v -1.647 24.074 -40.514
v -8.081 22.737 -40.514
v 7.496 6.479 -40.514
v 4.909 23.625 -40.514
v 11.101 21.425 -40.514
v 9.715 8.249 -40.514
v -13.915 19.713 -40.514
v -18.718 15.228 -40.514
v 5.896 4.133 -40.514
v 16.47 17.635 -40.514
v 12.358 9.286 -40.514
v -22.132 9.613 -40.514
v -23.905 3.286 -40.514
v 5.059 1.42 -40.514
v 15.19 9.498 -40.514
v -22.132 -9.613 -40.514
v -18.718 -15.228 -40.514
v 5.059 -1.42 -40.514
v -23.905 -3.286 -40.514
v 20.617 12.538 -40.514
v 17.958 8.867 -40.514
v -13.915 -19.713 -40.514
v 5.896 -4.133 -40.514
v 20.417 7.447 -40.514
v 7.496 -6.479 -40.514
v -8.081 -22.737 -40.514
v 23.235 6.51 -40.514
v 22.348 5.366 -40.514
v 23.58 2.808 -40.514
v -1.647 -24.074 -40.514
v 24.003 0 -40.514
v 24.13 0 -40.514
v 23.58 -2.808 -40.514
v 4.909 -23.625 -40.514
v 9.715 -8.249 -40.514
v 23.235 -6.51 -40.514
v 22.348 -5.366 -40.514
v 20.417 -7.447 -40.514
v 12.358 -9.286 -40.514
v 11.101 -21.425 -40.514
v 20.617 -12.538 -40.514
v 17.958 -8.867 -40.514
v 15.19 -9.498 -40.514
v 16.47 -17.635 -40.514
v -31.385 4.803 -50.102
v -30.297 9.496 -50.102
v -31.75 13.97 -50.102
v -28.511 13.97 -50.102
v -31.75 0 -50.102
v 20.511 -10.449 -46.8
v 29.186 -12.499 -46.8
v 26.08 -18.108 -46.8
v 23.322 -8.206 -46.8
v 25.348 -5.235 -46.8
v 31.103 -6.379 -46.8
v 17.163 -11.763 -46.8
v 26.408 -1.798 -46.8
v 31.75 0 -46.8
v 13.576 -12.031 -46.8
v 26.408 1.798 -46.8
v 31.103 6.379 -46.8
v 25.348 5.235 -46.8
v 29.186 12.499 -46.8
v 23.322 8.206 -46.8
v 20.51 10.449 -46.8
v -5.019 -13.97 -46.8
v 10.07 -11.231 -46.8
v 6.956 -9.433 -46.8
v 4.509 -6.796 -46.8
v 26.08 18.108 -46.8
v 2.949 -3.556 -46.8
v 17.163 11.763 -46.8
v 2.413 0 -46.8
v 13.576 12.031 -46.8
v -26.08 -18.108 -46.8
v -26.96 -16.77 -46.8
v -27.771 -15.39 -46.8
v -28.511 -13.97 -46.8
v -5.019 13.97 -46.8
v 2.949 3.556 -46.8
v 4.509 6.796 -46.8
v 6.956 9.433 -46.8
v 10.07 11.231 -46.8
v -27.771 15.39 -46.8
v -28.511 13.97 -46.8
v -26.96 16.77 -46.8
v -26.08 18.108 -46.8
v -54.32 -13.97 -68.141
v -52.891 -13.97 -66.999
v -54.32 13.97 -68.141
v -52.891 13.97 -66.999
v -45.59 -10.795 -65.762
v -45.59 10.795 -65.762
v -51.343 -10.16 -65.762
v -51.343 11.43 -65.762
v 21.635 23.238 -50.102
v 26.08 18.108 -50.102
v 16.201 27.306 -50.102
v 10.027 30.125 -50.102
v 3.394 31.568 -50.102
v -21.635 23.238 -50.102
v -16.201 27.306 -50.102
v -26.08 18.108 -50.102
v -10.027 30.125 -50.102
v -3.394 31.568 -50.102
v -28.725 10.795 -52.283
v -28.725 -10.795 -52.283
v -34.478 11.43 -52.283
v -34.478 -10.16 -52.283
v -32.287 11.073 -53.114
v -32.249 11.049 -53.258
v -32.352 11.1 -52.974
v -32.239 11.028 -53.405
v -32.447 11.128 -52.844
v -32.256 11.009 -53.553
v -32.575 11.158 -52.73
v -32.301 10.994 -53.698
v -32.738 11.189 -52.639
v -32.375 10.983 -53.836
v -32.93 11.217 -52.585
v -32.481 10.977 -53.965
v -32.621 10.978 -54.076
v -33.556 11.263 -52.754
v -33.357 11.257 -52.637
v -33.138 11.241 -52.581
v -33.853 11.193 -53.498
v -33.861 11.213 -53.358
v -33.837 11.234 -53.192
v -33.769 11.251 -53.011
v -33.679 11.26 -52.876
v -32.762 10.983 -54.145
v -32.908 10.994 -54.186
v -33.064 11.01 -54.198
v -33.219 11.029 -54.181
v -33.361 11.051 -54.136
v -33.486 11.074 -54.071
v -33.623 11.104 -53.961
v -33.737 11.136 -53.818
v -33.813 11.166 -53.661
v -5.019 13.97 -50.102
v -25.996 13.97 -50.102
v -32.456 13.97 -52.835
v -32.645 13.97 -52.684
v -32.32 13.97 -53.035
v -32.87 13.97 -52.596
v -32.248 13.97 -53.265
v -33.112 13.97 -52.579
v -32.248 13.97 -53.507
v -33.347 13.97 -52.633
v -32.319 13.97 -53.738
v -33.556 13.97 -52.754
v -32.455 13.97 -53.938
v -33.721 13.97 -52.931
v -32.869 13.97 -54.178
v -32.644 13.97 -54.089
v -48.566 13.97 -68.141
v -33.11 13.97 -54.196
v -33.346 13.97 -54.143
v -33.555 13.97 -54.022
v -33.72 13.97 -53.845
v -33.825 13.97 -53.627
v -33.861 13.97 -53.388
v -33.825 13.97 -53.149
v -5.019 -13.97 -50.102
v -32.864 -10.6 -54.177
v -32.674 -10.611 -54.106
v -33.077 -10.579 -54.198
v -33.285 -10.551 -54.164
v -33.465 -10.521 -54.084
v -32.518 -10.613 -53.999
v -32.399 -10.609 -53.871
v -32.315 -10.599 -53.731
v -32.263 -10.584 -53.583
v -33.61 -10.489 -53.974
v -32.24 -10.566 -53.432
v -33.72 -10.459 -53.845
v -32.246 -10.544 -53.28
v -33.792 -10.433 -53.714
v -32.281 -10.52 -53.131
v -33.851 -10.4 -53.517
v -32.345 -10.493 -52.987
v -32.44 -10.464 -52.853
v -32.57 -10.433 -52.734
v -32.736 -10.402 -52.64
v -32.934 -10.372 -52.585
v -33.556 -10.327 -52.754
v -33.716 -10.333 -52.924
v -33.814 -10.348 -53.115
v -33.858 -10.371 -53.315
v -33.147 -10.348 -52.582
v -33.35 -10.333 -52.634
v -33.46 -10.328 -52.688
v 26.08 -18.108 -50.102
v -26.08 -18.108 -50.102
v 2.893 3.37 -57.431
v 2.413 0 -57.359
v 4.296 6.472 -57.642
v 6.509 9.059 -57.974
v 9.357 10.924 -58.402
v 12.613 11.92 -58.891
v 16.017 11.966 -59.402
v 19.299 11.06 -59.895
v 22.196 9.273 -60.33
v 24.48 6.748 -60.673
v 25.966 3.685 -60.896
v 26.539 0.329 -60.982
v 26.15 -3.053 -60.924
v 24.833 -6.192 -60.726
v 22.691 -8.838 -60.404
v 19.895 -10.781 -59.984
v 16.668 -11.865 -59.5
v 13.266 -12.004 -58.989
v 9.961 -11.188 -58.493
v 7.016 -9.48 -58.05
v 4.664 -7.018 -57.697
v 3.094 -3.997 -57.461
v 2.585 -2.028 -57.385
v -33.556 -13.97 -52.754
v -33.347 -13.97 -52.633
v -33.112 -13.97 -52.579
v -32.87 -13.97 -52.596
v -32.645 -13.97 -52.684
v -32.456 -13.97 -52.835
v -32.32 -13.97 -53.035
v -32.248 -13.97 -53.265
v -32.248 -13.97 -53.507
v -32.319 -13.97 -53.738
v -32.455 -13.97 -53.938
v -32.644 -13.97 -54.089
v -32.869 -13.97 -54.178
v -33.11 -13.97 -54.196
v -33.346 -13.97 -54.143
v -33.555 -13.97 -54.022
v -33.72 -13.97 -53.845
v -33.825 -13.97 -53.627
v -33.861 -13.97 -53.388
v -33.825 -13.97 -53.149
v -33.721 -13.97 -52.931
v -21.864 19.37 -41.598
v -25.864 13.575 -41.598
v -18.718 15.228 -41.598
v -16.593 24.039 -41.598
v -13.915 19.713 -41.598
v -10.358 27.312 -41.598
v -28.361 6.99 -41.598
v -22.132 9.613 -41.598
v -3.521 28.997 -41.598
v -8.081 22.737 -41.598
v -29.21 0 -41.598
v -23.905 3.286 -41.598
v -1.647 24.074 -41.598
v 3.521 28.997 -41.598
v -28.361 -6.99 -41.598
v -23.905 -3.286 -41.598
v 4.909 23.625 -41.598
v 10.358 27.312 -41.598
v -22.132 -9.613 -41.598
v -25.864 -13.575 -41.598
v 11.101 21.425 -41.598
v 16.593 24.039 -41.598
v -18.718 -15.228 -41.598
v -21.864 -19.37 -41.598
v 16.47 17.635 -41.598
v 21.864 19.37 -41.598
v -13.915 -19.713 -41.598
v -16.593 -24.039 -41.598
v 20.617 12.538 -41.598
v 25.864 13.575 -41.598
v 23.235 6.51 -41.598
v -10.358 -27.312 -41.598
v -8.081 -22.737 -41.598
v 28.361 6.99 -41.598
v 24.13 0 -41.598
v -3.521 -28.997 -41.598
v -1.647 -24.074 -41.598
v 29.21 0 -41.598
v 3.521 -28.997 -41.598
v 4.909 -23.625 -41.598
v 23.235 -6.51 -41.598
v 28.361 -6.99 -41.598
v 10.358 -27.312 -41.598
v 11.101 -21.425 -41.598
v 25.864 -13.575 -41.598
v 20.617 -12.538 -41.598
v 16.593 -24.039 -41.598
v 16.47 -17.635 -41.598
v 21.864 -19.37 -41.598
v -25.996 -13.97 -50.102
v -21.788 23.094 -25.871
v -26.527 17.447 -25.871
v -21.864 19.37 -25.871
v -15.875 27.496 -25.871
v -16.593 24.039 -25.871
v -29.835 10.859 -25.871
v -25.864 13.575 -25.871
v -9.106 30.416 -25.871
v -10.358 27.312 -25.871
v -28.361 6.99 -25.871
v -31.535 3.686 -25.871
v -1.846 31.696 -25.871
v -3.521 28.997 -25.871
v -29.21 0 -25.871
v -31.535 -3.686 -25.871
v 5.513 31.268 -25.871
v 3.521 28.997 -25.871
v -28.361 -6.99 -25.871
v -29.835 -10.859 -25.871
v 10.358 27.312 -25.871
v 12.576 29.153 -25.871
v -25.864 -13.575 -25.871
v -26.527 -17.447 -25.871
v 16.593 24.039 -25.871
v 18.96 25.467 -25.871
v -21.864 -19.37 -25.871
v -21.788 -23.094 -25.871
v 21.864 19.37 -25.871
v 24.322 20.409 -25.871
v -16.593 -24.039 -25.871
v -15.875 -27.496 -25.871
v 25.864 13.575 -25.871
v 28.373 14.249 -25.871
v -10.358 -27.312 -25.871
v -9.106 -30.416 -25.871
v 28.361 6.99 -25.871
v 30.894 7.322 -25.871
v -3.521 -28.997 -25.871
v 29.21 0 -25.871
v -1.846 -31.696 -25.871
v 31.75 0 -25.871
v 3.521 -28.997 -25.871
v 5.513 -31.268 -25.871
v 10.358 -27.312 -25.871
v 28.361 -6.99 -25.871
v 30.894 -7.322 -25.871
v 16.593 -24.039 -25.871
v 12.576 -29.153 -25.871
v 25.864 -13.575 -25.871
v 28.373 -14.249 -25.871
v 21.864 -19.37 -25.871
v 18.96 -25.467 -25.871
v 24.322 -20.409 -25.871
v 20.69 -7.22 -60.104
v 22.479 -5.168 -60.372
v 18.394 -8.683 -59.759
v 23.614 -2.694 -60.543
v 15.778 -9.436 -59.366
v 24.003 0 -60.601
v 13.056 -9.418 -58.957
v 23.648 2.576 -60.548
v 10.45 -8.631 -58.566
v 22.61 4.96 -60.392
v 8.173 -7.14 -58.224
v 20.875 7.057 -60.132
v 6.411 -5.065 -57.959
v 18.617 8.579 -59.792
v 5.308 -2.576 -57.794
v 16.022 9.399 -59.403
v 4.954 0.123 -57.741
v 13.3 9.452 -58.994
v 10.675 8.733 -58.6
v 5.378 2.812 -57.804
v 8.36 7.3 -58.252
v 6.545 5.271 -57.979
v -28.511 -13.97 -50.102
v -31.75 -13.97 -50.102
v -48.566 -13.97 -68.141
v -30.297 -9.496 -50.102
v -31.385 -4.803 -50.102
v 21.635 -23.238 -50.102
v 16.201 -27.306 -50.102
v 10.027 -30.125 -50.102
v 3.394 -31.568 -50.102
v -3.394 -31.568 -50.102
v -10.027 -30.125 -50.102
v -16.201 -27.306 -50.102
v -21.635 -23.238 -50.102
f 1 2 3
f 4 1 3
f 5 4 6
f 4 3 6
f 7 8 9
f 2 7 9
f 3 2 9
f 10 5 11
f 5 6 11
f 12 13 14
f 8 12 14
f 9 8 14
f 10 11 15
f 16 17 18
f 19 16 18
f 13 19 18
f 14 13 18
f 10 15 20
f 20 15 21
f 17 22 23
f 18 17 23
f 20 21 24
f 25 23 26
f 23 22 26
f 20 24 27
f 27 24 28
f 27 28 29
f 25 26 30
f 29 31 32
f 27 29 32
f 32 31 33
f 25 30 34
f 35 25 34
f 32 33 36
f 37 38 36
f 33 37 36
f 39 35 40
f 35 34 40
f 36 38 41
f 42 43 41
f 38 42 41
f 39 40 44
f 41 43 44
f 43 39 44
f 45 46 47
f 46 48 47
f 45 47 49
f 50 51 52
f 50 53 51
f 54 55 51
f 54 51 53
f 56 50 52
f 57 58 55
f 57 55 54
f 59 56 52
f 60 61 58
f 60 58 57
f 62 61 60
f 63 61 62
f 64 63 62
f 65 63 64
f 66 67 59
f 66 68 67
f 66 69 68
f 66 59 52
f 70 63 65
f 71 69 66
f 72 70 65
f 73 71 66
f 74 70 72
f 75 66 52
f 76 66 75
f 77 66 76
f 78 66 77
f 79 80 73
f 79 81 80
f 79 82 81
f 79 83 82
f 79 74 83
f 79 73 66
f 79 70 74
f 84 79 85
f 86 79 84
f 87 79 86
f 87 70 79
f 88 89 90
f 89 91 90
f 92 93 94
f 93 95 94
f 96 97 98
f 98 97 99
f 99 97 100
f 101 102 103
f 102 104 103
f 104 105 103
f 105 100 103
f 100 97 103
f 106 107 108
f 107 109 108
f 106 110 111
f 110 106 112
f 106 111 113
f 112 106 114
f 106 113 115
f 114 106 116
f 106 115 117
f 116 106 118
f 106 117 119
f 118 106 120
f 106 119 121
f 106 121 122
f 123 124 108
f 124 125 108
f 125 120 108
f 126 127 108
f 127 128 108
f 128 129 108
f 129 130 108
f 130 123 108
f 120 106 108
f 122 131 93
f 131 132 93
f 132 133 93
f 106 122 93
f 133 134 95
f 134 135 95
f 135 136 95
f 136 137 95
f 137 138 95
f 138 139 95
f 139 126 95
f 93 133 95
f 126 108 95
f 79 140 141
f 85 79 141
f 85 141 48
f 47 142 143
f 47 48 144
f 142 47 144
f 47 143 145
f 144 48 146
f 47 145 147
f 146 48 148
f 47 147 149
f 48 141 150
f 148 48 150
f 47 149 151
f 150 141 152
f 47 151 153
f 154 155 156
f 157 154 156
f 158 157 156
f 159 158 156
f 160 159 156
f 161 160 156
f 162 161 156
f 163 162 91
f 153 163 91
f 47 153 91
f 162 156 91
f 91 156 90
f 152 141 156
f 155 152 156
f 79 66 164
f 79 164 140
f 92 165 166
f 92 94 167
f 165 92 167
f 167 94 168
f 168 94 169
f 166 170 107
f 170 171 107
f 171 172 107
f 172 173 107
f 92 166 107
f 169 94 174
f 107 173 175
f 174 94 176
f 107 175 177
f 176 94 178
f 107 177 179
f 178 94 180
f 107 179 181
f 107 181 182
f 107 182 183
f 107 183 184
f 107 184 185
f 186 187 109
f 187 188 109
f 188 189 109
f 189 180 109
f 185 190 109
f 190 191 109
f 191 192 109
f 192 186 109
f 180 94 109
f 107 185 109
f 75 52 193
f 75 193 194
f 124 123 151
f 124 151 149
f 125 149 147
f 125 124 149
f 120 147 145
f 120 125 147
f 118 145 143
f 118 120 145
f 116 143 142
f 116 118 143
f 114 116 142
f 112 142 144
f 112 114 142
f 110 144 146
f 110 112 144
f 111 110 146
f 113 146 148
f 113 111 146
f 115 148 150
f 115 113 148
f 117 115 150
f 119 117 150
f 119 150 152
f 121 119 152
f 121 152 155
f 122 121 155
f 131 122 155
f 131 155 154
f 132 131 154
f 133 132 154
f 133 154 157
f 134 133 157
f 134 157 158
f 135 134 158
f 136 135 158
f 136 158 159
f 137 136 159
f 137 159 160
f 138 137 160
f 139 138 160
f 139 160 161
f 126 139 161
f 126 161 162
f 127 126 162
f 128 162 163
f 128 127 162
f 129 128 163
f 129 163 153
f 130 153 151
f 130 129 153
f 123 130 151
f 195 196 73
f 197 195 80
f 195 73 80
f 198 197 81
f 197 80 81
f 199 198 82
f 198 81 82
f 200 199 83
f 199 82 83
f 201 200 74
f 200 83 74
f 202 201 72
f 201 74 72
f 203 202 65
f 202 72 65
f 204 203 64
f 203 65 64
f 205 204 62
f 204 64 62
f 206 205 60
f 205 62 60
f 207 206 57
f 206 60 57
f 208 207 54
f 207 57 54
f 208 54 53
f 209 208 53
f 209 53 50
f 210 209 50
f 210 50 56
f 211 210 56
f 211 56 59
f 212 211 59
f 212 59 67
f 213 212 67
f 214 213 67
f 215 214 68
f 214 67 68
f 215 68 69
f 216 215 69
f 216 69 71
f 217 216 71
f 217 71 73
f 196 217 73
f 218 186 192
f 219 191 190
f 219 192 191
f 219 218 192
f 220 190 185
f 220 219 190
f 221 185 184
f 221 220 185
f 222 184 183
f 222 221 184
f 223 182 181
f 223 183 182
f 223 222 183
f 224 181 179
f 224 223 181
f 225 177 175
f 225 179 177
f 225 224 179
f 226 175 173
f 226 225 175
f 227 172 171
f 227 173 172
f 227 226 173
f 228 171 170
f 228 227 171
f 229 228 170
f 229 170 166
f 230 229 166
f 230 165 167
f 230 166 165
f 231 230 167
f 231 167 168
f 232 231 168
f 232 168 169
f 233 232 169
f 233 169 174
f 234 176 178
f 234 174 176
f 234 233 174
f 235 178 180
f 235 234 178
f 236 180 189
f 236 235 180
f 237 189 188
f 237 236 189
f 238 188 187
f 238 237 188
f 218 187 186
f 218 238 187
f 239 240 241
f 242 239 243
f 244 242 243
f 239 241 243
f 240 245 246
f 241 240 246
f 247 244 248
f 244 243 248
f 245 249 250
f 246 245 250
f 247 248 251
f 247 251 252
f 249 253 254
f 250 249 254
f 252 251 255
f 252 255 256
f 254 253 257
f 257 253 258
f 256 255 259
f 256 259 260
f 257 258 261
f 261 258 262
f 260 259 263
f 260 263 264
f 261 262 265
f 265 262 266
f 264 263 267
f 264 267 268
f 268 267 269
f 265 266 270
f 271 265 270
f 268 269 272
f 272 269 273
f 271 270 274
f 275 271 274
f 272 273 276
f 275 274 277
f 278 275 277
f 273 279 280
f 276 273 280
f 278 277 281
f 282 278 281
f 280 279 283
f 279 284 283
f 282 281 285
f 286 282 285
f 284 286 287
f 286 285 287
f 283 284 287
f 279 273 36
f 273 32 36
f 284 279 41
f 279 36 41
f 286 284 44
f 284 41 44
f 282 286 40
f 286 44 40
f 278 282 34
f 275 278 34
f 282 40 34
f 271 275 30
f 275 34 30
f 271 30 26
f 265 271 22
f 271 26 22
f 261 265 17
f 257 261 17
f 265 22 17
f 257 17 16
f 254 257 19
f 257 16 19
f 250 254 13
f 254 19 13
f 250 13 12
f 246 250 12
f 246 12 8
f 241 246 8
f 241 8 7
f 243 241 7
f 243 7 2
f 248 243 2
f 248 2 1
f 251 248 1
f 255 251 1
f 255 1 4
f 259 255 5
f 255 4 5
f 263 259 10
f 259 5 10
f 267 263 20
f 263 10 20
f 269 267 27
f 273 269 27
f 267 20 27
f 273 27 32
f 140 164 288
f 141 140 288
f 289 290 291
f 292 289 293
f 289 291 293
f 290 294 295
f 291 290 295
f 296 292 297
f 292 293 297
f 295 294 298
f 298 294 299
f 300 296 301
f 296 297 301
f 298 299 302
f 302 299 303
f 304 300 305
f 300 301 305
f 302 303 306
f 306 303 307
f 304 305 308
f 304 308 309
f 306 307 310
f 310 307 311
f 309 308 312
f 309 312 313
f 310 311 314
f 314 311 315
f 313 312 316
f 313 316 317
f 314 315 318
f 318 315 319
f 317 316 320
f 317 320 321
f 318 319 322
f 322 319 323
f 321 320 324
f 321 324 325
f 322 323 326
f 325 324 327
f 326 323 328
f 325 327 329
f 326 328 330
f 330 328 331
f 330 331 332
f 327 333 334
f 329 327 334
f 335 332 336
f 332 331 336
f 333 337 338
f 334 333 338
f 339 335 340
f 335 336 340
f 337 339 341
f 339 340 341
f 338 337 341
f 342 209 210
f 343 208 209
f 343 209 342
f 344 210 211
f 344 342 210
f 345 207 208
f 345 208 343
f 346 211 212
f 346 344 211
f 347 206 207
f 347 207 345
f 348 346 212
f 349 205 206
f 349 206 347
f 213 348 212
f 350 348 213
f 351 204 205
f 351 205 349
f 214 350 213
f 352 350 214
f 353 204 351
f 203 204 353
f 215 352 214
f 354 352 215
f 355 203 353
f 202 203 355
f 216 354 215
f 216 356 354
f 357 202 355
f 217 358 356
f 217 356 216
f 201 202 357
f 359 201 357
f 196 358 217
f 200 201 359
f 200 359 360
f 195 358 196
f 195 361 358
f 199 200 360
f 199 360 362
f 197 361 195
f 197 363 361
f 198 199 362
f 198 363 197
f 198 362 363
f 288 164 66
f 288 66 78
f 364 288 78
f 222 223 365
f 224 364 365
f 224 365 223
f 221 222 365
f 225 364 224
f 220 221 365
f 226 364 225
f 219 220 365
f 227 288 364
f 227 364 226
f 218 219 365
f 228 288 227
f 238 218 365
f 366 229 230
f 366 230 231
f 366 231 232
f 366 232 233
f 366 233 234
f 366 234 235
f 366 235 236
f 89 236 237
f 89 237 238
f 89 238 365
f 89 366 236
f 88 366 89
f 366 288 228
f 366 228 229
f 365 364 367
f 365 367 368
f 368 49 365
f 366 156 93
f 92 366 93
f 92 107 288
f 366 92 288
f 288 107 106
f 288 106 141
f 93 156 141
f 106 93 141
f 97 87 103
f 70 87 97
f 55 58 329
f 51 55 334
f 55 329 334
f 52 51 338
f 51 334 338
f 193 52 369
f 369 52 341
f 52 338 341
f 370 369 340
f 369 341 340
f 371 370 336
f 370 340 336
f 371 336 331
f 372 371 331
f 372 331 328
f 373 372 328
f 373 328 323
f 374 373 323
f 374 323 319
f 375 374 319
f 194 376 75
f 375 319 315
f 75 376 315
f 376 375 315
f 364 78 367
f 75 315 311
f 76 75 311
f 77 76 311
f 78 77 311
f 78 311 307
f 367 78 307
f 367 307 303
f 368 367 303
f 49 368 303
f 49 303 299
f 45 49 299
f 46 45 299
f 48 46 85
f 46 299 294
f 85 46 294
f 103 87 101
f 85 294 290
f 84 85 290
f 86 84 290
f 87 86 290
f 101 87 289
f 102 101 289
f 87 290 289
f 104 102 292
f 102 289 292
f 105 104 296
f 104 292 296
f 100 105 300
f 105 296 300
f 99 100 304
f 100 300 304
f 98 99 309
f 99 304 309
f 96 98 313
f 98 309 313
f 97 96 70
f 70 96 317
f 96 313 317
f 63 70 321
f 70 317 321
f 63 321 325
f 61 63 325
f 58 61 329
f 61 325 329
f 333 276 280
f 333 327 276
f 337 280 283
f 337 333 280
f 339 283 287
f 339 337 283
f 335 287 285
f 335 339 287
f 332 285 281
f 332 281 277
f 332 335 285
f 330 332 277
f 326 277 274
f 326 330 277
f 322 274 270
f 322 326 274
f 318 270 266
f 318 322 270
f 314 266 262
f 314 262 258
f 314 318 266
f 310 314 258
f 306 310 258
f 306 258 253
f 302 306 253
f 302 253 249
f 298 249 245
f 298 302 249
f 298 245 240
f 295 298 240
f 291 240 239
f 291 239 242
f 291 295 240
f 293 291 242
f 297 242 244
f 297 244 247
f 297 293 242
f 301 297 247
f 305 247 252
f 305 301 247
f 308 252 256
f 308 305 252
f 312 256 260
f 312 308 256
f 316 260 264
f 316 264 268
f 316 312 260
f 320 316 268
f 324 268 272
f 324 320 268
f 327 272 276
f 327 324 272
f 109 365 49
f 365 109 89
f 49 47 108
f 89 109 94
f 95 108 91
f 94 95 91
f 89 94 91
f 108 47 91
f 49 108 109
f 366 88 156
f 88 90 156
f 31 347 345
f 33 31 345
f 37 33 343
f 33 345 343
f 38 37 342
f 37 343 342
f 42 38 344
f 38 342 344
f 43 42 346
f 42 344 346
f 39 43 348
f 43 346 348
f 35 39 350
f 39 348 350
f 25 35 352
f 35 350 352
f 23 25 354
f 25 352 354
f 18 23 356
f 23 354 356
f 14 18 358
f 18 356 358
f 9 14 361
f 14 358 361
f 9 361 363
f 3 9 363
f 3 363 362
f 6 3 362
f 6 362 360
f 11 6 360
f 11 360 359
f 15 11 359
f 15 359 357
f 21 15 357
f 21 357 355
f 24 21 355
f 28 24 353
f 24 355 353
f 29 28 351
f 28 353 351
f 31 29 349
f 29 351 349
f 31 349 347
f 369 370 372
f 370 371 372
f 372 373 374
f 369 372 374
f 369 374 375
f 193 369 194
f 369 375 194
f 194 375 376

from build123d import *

# Parameters (mm, degrees)
SKETCH2_R                   = 9.525
LID_HOLE_DEPTH              = 50.8
SKETCH5_R                   = 12.065
LID_MOUTHPIECE_DEPTH        = 13.97
SKETCH6_R                   = 9.525
LID_HOLE_2_DEPTH            = 59.953263205
LID_HANDLE_DEPTH            = 13.97
SLOT_START                  = -3.302
SKETCH11_R                  = 12.065
SLOT_FOR_COVER_DEPTH        = 3.302
ANGLED_MOUTHPIECE_CUT_DEPTH = 12.7
CUT_EXTRUDE3_START          = -27.94
SKETCH15_R                  = 0.811013261
CUT_EXTRUDE3_DEPTH          = 27.94


with BuildPart() as part:
    # Sketch1 → Lid Shape (revolve)
    with BuildSketch(Plane(origin=(0, 0, 0), x_dir=(1, 0, 0), z_dir=(0, 1, 0))):
        Polygon((0, 50.10238266), (31.75, 50.10238266), (31.75, 25.87078266), (29.21, 25.87078266), (29.21, 40.51388266), (29.21, 41.597899191), (24.13, 41.597899191), (24.13, 40.51388266), (0, 40.51388266), align=None)
    revolve(axis=Axis((0, 0, 0), (0, 0, -1)))

    # Sketch2 → Lid Hole (cut)
    with BuildSketch(Plane.XY.offset(-40.51388266)):
        with Locations((14.478, 0)):
            Circle(SKETCH2_R)
    extrude(amount=-LID_HOLE_DEPTH, mode=Mode.SUBTRACT)

    # Sketch5 → Lid Mouthpiece (add)
    with BuildSketch(Plane(origin=(0, 0, -50.10238266), x_dir=(-1, 0, 0), z_dir=(0, 0, -1))):
        with Locations((-14.478, 0)):
            Circle(SKETCH5_R)
    extrude(amount=LID_MOUTHPIECE_DEPTH)

    # Sketch6 → Lid Hole 2 (cut, through all)
    with BuildSketch(Plane(origin=(0, 0, -64.07238266), x_dir=(-1, 0, 0), z_dir=(0, 0, -1))):
        with Locations(Location((-14.478, 0, 0), (0, 0, 180))):
            Circle(SKETCH6_R)
    extrude(amount=-LID_HOLE_2_DEPTH, mode=Mode.SUBTRACT)

    # Sketch8 → Lid Handle (add, symmetric)
    with BuildSketch(Plane(origin=(0, 0, 0), x_dir=(1, 0, 0), z_dir=(0, 1, 0))):
        Polygon((-31.75, 50.10238266), (-52.891013527, 66.999169477), (-54.31959445, 68.140951412), (-48.565910523, 68.140951412), (-25.996316072, 50.10238266), align=None)
    extrude(amount=LID_HANDLE_DEPTH, both=True)

    # Sketch9 → Handle Hole section 0
    with BuildSketch(Plane(origin=(14.301912302, 0, -17.894344333), x_dir=(-0.7811575478192837, 0, -0.6243339534936118), z_dir=(0.6243339534936119, 0, -0.7811575478192838))):
        with BuildLine():
            Line((55.080337161, 10.795), (76.670337161, 10.795))
            Line((76.670337161, 10.795), (76.670337161, -10.795))
            Line((76.670337161, -10.795), (55.080337161, -10.795))
            Line((55.080337161, -10.795), (55.080337161, 10.795))
        make_face()
    # Sketch10 → Handle Hole section 1
    with BuildSketch(Plane(origin=(12.059167241, 0, -15.088254384), x_dir=(0.7811575478192838, 0, 0.6243339534936119), z_dir=(-0.6243339534936118, 0, 0.7811575478192837))):
        with BuildLine():
            Line((-81.164870789, 11.43), (-59.574870789, 11.43))
            Line((-59.574870789, 11.43), (-59.574870789, -10.16))
            Line((-59.574870789, -10.16), (-81.164870789, -10.16))
            Line((-81.164870789, -10.16), (-81.164870789, 11.43))
        make_face()
    loft(mode=Mode.SUBTRACT)

    # Sketch11 → Slot for Cover (cut)
    with BuildSketch(Plane(origin=(0, 0, -50.10238266), x_dir=(-1, 0, 0), z_dir=(0, 0, -1)).offset(SLOT_START)):
        with BuildLine():
            ThreePointArc((28.511429287, 13.97), (27.373977798, 16.085019102), (26.079920429, 18.108016192))
            Line((26.079920429, 18.108016192), (-26.079920429, 18.108016192))
            ThreePointArc((-26.079920429, 18.108016192), (-30.299339709, 9.48749246), (-31.75, 0))
            ThreePointArc((-31.75, 0), (-30.299339709, -9.48749246), (-26.079920429, -18.108016192))
            Line((-26.079920429, -18.108016192), (26.079920429, -18.108016192))
            ThreePointArc((26.079920429, -18.108016192), (27.373977798, -16.085019102), (28.511429287, -13.97))
            Line((28.511429287, -13.97), (25.996316072, -13.97))
            Line((25.996316072, -13.97), (5.018618521, -13.97))
            Line((5.018618521, -13.97), (5.018618521, 13.97))
            Line((5.018618521, 13.97), (25.996316072, 13.97))
            Line((25.996316072, 13.97), (28.511429287, 13.97))
        make_face()
        with Locations((-14.478, 0)):
            Circle(SKETCH11_R, mode=Mode.SUBTRACT)
    extrude(amount=SLOT_FOR_COVER_DEPTH, mode=Mode.SUBTRACT)

    # Sketch12 → Angled Mouthpiece Cut (cut, symmetric)
    with BuildSketch(Plane(origin=(0, 0, 0), x_dir=(1, 0, 0), z_dir=(0, 1, 0))):
        Polygon((26.628471811, 67.14025983), (26.628471811, 60.995566014), (2.357445469, 57.350666014), (2.357445469, 67.14025983), align=None)
    extrude(amount=ANGLED_MOUTHPIECE_CUT_DEPTH, both=True, mode=Mode.SUBTRACT)

    # Sketch15 → Cut-Extrude3 (cut)
    with BuildSketch(Plane(origin=(0, 13.97, 0), x_dir=(1, 0, 0), z_dir=(0, 1, 0)).offset(CUT_EXTRUDE3_START)):
        with Locations(Location((-33.050089725, 53.387241314, 0), (0, 0, 231.366681908))):
            Circle(SKETCH15_R)
    extrude(amount=CUT_EXTRUDE3_DEPTH, mode=Mode.SUBTRACT)


solid = part.part
